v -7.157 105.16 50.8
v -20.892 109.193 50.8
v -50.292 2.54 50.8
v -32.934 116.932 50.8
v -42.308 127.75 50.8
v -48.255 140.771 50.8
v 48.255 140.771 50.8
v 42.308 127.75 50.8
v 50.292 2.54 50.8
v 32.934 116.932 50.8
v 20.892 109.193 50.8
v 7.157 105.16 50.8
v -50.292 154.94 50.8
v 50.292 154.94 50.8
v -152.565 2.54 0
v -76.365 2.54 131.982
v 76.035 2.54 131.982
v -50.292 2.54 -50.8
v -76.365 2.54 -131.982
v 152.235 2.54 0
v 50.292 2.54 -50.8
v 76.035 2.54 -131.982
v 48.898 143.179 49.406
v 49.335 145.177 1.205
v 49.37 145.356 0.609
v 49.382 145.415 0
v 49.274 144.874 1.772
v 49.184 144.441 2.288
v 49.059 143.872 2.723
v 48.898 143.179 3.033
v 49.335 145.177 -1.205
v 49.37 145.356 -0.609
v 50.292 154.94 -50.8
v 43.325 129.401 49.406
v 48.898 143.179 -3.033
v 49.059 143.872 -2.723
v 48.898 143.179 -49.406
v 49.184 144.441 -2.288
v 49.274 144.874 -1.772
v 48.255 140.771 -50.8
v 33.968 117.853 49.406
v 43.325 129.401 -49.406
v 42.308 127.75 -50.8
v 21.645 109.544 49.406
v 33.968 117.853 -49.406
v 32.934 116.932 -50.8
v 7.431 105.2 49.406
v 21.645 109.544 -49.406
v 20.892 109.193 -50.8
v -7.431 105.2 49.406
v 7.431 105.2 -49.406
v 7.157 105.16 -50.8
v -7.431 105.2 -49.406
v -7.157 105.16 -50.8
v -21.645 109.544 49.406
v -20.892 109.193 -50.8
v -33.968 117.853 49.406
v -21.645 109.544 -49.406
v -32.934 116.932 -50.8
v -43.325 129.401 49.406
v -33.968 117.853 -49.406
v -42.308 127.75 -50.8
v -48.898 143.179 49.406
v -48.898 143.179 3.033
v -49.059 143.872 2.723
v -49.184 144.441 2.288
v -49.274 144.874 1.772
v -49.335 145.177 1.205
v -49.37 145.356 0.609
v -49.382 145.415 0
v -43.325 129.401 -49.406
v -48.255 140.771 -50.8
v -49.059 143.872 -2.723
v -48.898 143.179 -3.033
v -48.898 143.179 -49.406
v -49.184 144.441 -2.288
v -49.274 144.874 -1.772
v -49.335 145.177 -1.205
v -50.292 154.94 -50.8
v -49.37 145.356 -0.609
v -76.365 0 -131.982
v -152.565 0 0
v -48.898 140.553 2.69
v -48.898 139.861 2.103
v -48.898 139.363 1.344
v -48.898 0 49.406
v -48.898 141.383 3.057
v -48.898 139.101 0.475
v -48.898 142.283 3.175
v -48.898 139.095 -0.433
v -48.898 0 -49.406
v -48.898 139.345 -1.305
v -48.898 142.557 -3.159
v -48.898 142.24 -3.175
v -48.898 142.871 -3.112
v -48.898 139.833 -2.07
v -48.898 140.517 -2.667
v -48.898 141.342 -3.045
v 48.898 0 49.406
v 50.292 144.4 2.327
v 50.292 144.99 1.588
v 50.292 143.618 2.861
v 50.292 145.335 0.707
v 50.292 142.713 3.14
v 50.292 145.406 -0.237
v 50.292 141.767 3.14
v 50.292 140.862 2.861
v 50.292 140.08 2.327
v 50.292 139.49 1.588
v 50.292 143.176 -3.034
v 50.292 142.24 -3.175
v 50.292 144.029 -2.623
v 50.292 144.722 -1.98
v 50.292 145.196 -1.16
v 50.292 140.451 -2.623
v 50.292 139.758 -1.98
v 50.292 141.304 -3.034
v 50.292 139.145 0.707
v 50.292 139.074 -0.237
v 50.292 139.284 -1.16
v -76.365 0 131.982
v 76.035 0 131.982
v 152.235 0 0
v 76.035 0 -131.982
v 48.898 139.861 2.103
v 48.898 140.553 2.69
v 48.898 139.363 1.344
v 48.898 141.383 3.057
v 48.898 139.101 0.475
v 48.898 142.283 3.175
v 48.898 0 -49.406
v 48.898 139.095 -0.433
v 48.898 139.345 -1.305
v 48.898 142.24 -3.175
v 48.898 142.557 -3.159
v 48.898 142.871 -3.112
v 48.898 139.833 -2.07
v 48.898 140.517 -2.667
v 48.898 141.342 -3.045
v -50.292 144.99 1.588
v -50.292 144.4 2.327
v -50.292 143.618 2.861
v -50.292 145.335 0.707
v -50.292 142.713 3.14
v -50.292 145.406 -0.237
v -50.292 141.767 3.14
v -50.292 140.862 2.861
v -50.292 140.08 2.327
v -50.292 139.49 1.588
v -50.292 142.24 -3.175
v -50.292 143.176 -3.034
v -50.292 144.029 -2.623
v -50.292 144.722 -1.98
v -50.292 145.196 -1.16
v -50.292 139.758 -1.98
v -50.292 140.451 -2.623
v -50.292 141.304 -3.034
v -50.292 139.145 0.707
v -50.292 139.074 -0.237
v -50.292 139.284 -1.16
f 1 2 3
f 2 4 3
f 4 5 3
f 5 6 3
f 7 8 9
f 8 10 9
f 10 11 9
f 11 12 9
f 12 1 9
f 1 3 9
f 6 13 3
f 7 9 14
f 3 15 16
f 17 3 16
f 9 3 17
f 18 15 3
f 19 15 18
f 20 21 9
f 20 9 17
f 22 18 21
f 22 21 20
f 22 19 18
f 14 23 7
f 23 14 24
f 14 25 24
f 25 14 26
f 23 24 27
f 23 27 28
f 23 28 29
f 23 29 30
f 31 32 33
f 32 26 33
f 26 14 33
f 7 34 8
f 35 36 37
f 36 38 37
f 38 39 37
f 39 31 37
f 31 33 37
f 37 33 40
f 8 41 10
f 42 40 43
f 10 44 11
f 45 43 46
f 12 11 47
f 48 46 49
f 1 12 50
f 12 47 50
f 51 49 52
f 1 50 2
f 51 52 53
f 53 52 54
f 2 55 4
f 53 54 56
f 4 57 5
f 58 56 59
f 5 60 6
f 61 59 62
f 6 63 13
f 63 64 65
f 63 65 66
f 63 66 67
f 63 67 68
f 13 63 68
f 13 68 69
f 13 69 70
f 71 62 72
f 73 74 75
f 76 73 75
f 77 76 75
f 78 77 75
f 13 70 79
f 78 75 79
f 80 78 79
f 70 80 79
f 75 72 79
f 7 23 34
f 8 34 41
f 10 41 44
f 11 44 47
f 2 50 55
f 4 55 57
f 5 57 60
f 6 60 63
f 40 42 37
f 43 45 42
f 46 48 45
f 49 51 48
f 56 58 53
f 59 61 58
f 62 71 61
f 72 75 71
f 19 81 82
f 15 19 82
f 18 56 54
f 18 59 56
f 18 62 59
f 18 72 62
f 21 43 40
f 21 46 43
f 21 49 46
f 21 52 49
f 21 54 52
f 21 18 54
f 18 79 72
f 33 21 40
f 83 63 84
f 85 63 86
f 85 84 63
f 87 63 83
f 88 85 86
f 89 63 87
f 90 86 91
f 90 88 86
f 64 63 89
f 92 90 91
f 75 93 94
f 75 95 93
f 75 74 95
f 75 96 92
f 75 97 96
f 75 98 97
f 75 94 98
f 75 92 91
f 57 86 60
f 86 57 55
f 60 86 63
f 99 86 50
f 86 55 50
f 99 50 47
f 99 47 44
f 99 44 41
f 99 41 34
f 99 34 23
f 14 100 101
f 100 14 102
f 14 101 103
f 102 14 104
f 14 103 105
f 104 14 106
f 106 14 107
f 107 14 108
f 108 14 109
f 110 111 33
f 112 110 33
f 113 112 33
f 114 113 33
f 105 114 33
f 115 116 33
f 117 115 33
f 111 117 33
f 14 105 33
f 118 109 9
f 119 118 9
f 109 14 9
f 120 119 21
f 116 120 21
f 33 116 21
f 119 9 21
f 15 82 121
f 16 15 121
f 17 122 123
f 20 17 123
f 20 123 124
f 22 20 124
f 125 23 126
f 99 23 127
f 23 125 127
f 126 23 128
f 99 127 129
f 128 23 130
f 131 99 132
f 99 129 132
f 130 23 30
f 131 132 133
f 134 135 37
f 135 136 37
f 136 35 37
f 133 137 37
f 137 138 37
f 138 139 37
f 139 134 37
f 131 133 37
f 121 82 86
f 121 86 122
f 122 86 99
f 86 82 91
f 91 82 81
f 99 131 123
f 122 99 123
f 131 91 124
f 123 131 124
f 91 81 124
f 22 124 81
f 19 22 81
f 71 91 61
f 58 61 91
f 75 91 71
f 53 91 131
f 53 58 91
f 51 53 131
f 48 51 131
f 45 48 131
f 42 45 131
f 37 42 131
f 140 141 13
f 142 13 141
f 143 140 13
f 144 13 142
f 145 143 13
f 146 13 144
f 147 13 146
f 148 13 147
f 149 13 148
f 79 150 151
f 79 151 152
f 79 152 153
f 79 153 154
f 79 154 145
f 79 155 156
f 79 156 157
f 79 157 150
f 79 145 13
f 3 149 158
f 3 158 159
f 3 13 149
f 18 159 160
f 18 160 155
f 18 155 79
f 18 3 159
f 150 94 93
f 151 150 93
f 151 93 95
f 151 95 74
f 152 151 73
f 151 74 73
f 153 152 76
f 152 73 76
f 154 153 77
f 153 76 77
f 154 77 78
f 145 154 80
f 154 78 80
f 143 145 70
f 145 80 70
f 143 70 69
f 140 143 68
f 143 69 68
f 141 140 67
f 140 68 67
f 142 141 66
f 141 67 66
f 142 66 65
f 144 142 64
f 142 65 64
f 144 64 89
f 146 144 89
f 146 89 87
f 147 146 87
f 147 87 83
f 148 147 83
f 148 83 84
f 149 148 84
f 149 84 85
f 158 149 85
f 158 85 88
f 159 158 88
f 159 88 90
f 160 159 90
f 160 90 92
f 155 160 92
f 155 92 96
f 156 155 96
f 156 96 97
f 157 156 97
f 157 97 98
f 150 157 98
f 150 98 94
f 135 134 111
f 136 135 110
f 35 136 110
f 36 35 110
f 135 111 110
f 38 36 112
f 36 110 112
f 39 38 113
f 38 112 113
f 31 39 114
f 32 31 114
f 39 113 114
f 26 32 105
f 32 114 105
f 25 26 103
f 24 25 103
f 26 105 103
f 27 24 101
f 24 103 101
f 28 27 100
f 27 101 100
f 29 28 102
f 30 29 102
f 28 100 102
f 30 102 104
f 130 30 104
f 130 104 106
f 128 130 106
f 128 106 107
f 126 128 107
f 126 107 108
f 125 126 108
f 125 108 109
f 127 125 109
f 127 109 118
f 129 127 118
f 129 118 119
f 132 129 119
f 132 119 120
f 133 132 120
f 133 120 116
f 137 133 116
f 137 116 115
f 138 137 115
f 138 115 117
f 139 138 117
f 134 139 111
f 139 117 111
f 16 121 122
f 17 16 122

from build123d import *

# Parameters (mm, degrees)
BOSS_EXTRUDE1_DEPTH     = 2.54
SKETCH2_W               = 100.584
SKETCH2_H               = 101.6
BOSS_EXTRUDE2_DEPTH     = 152.4
SKETCH4_W               = 97.79508
SKETCH4_H               = 98.81108
CUT_EXTRUDE1_DEPTH      = 190.5
SKETCH6_R               = 3.175
CUT_EXTRUDE2_DEPTH      = 203.856506729
CUT_EXTRUDE4_DEPTH      = 82.182271537
CUT_EXTRUDE4_DEPTH_BACK = 183.782271537


with BuildPart() as part:
    # Sketch1 → Boss-Extrude1 (new body)
    with BuildSketch(Plane(origin=(0, 0, 0), x_dir=(1, 0, 0), z_dir=(0, 1, 0))):
        Polygon((76.035493271, -131.982271537), (152.235493271, 0), (76.035493271, 131.982271537), (-76.364506729, 131.982271537), (-152.564506729, 0), (-76.364506729, -131.982271537), align=None)
    extrude(amount=BOSS_EXTRUDE1_DEPTH)

    # Sketch2 → Boss-Extrude2 (add)
    with BuildSketch(Plane(origin=(0, 2.54, 0), x_dir=(1, 0, 0), z_dir=(0, 1, 0))):
        Rectangle(SKETCH2_W, SKETCH2_H)
    extrude(amount=BOSS_EXTRUDE2_DEPTH)

    # Sketch4 → Cut-Extrude1 (cut)
    with BuildSketch(Plane(origin=(0, 154.94, 0), x_dir=(1, 0, 0), z_dir=(0, 1, 0))):
        Rectangle(SKETCH4_W, SKETCH4_H)
    extrude(amount=-CUT_EXTRUDE1_DEPTH, mode=Mode.SUBTRACT)

    # Sketch6 → Cut-Extrude2 (cut, through all)
    with BuildSketch(Plane(origin=(50.292, 0, 0), x_dir=(0, 0, -1), z_dir=(1, 0, 0))):
        with Locations((0, 142.24)):
            Circle(SKETCH6_R)
    extrude(amount=-CUT_EXTRUDE2_DEPTH, mode=Mode.SUBTRACT)

    # Sketch7 → Cut-Extrude4 (cut, two sides)
    with BuildSketch(Plane(origin=(0, 0, -50.8), x_dir=(-1, 0, 0), z_dir=(0, 0, -1))) as cut_extrude4_sk:
        with BuildLine():
            Line((-50.292, 675.458034637), (-50.292, 154.94))
            ThreePointArc((-50.292, 154.94), (0, 104.648), (50.292, 154.94))
            Line((50.292, 154.94), (50.292, 675.458034637))
            Line((50.292, 675.458034637), (50.292, 1716.494103911))
            Line((50.292, 1716.494103911), (-50.292, 1716.494103911))
            Line((-50.292, 1716.494103911), (-50.292, 675.458034637))
        make_face()
    extrude(amount=CUT_EXTRUDE4_DEPTH, mode=Mode.SUBTRACT)
    extrude(cut_extrude4_sk.sketch, amount=-CUT_EXTRUDE4_DEPTH_BACK, mode=Mode.SUBTRACT)


solid = part.part
